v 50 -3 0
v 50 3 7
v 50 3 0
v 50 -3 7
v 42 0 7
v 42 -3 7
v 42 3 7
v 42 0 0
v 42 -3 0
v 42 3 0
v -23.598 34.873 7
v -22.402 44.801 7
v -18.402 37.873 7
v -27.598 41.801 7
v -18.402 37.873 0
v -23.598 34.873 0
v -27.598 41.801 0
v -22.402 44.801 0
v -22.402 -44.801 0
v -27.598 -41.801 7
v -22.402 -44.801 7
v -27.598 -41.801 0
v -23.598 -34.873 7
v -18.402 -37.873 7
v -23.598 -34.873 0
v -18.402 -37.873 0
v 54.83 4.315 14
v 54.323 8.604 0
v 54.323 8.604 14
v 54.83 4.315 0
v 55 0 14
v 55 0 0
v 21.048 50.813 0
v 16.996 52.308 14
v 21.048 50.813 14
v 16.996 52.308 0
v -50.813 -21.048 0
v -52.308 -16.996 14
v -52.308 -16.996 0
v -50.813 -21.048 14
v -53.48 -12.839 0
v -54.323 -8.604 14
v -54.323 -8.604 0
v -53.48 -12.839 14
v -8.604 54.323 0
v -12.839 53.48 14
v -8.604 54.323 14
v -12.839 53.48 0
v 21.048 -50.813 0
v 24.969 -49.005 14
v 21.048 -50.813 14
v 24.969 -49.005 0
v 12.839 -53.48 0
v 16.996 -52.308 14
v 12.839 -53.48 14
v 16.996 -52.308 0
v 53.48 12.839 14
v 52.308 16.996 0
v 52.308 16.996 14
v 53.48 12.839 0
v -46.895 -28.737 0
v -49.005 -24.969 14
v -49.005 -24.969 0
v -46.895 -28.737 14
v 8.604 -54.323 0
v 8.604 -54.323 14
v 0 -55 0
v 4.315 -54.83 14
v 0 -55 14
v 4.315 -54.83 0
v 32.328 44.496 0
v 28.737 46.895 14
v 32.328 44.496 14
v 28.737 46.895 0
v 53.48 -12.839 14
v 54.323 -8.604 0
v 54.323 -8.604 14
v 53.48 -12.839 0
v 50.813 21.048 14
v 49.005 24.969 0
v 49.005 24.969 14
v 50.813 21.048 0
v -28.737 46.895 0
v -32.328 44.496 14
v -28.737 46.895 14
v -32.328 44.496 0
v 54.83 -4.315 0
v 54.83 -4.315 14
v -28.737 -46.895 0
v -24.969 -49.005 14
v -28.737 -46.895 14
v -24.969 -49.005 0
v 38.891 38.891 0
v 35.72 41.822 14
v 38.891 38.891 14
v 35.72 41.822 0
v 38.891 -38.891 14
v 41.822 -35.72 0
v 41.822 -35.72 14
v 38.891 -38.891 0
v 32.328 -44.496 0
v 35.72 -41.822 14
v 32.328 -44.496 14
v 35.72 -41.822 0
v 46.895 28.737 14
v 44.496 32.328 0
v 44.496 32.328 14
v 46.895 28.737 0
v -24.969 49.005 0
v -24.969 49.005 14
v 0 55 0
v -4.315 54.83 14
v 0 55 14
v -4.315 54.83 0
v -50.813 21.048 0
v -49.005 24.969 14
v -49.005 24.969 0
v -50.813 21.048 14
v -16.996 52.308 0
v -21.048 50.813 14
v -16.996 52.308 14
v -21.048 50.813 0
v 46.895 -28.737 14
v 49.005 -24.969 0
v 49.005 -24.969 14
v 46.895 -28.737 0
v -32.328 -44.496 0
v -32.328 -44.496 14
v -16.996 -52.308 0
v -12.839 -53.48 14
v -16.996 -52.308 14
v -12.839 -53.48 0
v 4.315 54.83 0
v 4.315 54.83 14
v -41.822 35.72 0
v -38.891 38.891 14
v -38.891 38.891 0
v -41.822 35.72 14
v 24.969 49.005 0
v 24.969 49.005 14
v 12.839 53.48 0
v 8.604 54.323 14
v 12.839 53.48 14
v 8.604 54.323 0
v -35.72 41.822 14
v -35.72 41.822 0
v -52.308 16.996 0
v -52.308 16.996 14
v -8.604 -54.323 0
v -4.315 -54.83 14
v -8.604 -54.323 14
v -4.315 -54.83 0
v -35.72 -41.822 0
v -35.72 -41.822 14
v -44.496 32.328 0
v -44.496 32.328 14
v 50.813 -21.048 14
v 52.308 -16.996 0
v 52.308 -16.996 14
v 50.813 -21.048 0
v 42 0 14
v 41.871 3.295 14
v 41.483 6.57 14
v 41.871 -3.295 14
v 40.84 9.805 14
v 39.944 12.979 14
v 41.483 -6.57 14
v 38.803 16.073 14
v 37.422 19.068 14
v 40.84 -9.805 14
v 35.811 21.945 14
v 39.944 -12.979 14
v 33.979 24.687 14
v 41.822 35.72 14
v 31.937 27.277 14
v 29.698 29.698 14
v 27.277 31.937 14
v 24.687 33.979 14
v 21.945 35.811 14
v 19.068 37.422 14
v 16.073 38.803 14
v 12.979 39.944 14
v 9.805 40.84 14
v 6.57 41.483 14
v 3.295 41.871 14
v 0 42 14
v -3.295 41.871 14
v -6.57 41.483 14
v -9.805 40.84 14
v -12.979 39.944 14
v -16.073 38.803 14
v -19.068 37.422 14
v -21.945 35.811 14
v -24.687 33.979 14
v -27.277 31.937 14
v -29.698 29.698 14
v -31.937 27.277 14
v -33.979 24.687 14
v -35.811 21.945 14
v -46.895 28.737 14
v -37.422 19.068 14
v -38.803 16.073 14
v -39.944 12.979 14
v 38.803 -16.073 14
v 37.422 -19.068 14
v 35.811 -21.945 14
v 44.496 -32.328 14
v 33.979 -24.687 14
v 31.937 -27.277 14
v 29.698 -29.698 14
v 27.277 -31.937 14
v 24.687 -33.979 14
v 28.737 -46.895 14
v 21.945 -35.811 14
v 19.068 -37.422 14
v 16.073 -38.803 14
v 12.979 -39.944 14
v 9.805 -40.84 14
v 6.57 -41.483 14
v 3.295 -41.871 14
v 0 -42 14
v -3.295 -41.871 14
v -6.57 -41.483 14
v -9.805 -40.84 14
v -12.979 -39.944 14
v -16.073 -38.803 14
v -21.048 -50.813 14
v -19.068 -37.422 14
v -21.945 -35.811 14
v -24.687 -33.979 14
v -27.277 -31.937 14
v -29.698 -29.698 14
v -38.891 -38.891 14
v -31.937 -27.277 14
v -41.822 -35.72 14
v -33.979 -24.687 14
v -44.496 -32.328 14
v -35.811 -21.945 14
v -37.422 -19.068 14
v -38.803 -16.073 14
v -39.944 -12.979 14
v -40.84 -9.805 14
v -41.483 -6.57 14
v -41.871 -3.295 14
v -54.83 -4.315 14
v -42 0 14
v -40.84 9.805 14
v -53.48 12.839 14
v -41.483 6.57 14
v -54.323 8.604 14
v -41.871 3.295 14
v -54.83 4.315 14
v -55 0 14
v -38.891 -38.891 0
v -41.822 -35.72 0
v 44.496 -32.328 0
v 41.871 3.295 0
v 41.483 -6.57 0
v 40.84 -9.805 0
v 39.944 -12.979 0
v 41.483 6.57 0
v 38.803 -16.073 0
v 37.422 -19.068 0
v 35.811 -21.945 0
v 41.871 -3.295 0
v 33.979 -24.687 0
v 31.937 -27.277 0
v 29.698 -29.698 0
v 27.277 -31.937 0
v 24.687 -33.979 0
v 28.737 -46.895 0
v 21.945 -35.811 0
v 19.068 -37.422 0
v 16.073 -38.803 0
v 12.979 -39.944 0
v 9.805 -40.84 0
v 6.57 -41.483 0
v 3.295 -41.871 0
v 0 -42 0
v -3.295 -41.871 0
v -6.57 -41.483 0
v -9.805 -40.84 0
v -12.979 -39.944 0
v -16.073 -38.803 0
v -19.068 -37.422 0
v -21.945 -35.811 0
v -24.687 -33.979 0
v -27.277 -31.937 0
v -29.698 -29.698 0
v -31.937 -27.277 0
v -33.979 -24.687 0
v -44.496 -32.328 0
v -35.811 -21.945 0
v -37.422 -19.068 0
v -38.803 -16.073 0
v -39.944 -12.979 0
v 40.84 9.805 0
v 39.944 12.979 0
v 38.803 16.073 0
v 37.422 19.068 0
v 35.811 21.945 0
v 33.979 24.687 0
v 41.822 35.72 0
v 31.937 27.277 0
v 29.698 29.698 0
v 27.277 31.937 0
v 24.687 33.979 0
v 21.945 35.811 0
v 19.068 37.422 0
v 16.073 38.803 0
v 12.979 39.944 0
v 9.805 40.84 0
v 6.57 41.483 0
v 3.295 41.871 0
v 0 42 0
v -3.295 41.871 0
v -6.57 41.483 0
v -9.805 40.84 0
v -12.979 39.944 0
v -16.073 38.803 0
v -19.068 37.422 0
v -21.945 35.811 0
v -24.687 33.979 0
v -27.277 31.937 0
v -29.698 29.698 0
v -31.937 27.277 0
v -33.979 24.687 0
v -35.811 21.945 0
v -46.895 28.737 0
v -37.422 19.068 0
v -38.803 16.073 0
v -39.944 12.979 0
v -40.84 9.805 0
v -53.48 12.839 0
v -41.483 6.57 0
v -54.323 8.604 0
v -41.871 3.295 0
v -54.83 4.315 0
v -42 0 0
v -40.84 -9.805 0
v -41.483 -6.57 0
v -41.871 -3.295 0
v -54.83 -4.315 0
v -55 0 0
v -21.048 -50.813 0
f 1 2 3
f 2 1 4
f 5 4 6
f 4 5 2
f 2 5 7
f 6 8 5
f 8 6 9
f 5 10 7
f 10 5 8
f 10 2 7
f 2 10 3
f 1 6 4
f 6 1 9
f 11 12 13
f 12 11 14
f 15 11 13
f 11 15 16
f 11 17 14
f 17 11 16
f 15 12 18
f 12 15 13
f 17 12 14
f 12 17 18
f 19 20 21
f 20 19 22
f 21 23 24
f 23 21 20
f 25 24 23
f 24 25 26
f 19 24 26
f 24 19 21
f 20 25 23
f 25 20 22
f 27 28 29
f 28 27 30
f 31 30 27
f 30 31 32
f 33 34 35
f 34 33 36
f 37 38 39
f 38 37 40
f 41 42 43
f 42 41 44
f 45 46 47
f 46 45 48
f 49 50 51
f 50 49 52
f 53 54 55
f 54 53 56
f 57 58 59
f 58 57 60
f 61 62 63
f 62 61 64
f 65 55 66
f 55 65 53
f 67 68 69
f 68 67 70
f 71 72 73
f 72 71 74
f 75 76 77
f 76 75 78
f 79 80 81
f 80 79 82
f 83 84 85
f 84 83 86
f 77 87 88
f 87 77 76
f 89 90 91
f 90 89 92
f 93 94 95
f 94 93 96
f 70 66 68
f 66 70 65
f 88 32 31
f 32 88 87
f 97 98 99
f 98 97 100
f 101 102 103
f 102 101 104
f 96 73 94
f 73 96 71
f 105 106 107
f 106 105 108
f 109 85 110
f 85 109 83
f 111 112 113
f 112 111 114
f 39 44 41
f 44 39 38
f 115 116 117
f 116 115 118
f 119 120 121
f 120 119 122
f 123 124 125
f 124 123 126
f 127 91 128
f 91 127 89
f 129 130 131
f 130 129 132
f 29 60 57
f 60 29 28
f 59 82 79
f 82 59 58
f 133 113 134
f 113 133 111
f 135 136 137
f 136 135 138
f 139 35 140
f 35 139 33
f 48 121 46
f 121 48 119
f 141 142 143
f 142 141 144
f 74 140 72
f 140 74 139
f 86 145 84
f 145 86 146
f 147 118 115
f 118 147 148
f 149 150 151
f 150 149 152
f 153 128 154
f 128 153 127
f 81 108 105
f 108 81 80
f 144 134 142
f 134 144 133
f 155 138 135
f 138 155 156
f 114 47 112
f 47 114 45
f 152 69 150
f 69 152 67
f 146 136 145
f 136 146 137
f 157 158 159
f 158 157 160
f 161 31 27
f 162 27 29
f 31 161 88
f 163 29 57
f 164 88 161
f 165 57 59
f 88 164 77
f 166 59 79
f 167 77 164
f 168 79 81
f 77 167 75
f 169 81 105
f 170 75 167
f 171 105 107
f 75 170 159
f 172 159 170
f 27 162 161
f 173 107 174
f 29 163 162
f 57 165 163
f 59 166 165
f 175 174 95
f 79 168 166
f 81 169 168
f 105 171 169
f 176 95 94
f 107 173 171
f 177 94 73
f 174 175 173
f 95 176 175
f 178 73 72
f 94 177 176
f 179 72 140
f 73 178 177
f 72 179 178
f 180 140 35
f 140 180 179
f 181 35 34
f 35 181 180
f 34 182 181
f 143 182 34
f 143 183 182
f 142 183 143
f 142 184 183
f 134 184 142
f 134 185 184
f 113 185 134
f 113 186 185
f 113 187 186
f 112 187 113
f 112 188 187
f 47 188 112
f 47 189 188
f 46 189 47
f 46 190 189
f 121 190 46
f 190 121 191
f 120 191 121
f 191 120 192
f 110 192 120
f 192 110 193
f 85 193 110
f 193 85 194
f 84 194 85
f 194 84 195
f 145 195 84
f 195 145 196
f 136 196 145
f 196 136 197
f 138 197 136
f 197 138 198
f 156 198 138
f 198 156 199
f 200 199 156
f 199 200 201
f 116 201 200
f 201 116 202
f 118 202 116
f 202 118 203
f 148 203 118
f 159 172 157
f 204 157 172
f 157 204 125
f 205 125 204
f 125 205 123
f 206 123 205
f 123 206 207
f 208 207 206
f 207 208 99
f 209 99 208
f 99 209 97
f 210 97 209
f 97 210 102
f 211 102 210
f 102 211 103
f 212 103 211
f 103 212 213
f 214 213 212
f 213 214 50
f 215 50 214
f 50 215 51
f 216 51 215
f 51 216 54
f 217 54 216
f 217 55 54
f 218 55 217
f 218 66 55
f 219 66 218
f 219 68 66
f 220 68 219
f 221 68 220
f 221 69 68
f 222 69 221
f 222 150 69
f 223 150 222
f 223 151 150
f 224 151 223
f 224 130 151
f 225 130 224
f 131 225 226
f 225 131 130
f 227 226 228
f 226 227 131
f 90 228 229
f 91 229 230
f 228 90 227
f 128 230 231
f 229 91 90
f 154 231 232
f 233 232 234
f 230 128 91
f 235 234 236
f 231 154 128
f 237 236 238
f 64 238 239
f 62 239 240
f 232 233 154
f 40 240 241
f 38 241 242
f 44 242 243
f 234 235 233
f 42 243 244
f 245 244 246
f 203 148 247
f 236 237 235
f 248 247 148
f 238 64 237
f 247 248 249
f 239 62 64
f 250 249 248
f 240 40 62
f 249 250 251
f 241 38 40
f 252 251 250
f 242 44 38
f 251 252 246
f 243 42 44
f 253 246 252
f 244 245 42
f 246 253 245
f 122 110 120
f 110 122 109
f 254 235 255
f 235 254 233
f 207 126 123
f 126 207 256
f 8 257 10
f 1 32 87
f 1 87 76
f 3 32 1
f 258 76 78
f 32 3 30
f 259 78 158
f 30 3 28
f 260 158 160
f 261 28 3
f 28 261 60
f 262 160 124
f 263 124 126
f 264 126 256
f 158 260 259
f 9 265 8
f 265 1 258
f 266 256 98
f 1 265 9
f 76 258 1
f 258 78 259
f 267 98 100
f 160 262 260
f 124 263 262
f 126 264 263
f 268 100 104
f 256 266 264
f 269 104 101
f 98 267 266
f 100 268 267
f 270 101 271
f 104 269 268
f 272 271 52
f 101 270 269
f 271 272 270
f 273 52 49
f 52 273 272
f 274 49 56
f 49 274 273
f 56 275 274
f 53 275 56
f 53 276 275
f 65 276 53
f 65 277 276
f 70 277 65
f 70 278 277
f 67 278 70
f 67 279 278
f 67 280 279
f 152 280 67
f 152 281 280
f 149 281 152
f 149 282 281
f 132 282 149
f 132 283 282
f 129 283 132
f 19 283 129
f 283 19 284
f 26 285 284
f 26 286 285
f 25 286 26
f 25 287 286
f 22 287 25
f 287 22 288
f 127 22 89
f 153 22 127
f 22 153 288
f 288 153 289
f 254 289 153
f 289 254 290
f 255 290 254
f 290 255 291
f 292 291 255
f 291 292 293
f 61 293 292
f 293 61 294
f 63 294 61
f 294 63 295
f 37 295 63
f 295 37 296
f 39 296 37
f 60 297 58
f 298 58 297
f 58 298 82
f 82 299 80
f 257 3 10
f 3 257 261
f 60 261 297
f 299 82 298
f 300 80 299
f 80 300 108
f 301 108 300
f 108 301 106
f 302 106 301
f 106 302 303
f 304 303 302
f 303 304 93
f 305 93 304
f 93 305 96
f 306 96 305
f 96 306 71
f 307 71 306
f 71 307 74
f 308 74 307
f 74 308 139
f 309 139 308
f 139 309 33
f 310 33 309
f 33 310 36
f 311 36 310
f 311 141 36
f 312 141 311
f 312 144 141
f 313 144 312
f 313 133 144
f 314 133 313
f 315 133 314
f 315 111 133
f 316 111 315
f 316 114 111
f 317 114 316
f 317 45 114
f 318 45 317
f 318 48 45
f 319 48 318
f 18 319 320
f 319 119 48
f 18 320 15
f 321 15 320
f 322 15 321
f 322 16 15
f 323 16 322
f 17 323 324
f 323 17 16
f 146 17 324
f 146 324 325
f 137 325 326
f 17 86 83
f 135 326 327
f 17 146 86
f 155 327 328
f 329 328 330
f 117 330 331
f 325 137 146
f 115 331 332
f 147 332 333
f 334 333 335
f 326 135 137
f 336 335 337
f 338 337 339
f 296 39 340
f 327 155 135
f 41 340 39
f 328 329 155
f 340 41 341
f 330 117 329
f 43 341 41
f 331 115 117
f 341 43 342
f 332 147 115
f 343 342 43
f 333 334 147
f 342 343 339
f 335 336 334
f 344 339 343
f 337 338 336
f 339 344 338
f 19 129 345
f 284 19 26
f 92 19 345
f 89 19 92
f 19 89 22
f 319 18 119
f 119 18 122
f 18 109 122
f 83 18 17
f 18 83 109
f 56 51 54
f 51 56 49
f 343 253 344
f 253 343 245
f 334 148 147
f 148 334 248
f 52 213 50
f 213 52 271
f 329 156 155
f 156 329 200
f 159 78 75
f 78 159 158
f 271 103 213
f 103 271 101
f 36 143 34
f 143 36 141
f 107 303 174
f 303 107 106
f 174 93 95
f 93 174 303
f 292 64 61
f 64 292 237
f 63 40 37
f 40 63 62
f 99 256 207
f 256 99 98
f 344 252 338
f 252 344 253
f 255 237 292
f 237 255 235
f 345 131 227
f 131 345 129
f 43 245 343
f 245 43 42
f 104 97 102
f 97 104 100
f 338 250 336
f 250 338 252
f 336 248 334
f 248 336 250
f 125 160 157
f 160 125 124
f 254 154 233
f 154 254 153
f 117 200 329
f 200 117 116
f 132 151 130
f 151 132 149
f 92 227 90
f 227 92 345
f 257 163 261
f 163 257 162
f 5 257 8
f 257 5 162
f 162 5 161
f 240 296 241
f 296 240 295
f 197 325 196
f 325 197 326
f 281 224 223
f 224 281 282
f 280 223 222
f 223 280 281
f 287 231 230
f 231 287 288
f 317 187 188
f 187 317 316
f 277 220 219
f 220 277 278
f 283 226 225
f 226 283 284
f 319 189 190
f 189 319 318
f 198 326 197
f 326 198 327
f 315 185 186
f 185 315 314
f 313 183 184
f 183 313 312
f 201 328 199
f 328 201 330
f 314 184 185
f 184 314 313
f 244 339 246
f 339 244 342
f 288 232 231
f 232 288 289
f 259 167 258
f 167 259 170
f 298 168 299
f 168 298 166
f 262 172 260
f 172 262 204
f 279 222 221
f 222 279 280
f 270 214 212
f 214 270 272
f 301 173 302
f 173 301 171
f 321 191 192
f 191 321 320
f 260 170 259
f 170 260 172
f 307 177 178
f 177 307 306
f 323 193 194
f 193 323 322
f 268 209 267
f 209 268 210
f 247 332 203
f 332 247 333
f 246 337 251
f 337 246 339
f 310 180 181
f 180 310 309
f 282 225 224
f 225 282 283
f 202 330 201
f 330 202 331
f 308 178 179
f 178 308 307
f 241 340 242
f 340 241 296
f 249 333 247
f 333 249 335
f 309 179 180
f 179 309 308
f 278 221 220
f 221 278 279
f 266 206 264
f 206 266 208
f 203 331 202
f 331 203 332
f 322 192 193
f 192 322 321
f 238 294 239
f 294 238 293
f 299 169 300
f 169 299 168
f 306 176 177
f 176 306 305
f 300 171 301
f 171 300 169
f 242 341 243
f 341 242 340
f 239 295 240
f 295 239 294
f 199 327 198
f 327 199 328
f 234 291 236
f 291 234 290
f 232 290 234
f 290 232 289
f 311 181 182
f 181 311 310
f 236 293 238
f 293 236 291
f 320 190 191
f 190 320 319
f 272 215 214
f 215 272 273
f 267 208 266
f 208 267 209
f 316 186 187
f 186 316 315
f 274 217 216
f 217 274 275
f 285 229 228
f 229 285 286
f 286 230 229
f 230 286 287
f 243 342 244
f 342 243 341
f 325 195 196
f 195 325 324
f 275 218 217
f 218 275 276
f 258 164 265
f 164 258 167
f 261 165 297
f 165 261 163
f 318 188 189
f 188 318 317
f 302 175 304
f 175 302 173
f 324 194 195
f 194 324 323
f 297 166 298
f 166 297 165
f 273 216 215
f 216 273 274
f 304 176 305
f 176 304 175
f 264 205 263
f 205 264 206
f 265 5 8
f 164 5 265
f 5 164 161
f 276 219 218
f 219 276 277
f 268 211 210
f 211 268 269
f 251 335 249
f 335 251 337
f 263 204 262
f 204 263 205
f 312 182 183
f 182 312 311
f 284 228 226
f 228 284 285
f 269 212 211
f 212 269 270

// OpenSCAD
// PlantSense Template B — Ring around root ball
$fn=80;
R_out=55; R_in=42; H=14;
difference(){
  cylinder(h=H,r=R_out);
  translate([0,0,-0.1]) cylinder(h=H+0.2,r=R_in);
  for(a=[0,120,240]) rotate([0,0,a]) translate([R_in+4,0,3]) cube([8,6,8], center=true);
}
